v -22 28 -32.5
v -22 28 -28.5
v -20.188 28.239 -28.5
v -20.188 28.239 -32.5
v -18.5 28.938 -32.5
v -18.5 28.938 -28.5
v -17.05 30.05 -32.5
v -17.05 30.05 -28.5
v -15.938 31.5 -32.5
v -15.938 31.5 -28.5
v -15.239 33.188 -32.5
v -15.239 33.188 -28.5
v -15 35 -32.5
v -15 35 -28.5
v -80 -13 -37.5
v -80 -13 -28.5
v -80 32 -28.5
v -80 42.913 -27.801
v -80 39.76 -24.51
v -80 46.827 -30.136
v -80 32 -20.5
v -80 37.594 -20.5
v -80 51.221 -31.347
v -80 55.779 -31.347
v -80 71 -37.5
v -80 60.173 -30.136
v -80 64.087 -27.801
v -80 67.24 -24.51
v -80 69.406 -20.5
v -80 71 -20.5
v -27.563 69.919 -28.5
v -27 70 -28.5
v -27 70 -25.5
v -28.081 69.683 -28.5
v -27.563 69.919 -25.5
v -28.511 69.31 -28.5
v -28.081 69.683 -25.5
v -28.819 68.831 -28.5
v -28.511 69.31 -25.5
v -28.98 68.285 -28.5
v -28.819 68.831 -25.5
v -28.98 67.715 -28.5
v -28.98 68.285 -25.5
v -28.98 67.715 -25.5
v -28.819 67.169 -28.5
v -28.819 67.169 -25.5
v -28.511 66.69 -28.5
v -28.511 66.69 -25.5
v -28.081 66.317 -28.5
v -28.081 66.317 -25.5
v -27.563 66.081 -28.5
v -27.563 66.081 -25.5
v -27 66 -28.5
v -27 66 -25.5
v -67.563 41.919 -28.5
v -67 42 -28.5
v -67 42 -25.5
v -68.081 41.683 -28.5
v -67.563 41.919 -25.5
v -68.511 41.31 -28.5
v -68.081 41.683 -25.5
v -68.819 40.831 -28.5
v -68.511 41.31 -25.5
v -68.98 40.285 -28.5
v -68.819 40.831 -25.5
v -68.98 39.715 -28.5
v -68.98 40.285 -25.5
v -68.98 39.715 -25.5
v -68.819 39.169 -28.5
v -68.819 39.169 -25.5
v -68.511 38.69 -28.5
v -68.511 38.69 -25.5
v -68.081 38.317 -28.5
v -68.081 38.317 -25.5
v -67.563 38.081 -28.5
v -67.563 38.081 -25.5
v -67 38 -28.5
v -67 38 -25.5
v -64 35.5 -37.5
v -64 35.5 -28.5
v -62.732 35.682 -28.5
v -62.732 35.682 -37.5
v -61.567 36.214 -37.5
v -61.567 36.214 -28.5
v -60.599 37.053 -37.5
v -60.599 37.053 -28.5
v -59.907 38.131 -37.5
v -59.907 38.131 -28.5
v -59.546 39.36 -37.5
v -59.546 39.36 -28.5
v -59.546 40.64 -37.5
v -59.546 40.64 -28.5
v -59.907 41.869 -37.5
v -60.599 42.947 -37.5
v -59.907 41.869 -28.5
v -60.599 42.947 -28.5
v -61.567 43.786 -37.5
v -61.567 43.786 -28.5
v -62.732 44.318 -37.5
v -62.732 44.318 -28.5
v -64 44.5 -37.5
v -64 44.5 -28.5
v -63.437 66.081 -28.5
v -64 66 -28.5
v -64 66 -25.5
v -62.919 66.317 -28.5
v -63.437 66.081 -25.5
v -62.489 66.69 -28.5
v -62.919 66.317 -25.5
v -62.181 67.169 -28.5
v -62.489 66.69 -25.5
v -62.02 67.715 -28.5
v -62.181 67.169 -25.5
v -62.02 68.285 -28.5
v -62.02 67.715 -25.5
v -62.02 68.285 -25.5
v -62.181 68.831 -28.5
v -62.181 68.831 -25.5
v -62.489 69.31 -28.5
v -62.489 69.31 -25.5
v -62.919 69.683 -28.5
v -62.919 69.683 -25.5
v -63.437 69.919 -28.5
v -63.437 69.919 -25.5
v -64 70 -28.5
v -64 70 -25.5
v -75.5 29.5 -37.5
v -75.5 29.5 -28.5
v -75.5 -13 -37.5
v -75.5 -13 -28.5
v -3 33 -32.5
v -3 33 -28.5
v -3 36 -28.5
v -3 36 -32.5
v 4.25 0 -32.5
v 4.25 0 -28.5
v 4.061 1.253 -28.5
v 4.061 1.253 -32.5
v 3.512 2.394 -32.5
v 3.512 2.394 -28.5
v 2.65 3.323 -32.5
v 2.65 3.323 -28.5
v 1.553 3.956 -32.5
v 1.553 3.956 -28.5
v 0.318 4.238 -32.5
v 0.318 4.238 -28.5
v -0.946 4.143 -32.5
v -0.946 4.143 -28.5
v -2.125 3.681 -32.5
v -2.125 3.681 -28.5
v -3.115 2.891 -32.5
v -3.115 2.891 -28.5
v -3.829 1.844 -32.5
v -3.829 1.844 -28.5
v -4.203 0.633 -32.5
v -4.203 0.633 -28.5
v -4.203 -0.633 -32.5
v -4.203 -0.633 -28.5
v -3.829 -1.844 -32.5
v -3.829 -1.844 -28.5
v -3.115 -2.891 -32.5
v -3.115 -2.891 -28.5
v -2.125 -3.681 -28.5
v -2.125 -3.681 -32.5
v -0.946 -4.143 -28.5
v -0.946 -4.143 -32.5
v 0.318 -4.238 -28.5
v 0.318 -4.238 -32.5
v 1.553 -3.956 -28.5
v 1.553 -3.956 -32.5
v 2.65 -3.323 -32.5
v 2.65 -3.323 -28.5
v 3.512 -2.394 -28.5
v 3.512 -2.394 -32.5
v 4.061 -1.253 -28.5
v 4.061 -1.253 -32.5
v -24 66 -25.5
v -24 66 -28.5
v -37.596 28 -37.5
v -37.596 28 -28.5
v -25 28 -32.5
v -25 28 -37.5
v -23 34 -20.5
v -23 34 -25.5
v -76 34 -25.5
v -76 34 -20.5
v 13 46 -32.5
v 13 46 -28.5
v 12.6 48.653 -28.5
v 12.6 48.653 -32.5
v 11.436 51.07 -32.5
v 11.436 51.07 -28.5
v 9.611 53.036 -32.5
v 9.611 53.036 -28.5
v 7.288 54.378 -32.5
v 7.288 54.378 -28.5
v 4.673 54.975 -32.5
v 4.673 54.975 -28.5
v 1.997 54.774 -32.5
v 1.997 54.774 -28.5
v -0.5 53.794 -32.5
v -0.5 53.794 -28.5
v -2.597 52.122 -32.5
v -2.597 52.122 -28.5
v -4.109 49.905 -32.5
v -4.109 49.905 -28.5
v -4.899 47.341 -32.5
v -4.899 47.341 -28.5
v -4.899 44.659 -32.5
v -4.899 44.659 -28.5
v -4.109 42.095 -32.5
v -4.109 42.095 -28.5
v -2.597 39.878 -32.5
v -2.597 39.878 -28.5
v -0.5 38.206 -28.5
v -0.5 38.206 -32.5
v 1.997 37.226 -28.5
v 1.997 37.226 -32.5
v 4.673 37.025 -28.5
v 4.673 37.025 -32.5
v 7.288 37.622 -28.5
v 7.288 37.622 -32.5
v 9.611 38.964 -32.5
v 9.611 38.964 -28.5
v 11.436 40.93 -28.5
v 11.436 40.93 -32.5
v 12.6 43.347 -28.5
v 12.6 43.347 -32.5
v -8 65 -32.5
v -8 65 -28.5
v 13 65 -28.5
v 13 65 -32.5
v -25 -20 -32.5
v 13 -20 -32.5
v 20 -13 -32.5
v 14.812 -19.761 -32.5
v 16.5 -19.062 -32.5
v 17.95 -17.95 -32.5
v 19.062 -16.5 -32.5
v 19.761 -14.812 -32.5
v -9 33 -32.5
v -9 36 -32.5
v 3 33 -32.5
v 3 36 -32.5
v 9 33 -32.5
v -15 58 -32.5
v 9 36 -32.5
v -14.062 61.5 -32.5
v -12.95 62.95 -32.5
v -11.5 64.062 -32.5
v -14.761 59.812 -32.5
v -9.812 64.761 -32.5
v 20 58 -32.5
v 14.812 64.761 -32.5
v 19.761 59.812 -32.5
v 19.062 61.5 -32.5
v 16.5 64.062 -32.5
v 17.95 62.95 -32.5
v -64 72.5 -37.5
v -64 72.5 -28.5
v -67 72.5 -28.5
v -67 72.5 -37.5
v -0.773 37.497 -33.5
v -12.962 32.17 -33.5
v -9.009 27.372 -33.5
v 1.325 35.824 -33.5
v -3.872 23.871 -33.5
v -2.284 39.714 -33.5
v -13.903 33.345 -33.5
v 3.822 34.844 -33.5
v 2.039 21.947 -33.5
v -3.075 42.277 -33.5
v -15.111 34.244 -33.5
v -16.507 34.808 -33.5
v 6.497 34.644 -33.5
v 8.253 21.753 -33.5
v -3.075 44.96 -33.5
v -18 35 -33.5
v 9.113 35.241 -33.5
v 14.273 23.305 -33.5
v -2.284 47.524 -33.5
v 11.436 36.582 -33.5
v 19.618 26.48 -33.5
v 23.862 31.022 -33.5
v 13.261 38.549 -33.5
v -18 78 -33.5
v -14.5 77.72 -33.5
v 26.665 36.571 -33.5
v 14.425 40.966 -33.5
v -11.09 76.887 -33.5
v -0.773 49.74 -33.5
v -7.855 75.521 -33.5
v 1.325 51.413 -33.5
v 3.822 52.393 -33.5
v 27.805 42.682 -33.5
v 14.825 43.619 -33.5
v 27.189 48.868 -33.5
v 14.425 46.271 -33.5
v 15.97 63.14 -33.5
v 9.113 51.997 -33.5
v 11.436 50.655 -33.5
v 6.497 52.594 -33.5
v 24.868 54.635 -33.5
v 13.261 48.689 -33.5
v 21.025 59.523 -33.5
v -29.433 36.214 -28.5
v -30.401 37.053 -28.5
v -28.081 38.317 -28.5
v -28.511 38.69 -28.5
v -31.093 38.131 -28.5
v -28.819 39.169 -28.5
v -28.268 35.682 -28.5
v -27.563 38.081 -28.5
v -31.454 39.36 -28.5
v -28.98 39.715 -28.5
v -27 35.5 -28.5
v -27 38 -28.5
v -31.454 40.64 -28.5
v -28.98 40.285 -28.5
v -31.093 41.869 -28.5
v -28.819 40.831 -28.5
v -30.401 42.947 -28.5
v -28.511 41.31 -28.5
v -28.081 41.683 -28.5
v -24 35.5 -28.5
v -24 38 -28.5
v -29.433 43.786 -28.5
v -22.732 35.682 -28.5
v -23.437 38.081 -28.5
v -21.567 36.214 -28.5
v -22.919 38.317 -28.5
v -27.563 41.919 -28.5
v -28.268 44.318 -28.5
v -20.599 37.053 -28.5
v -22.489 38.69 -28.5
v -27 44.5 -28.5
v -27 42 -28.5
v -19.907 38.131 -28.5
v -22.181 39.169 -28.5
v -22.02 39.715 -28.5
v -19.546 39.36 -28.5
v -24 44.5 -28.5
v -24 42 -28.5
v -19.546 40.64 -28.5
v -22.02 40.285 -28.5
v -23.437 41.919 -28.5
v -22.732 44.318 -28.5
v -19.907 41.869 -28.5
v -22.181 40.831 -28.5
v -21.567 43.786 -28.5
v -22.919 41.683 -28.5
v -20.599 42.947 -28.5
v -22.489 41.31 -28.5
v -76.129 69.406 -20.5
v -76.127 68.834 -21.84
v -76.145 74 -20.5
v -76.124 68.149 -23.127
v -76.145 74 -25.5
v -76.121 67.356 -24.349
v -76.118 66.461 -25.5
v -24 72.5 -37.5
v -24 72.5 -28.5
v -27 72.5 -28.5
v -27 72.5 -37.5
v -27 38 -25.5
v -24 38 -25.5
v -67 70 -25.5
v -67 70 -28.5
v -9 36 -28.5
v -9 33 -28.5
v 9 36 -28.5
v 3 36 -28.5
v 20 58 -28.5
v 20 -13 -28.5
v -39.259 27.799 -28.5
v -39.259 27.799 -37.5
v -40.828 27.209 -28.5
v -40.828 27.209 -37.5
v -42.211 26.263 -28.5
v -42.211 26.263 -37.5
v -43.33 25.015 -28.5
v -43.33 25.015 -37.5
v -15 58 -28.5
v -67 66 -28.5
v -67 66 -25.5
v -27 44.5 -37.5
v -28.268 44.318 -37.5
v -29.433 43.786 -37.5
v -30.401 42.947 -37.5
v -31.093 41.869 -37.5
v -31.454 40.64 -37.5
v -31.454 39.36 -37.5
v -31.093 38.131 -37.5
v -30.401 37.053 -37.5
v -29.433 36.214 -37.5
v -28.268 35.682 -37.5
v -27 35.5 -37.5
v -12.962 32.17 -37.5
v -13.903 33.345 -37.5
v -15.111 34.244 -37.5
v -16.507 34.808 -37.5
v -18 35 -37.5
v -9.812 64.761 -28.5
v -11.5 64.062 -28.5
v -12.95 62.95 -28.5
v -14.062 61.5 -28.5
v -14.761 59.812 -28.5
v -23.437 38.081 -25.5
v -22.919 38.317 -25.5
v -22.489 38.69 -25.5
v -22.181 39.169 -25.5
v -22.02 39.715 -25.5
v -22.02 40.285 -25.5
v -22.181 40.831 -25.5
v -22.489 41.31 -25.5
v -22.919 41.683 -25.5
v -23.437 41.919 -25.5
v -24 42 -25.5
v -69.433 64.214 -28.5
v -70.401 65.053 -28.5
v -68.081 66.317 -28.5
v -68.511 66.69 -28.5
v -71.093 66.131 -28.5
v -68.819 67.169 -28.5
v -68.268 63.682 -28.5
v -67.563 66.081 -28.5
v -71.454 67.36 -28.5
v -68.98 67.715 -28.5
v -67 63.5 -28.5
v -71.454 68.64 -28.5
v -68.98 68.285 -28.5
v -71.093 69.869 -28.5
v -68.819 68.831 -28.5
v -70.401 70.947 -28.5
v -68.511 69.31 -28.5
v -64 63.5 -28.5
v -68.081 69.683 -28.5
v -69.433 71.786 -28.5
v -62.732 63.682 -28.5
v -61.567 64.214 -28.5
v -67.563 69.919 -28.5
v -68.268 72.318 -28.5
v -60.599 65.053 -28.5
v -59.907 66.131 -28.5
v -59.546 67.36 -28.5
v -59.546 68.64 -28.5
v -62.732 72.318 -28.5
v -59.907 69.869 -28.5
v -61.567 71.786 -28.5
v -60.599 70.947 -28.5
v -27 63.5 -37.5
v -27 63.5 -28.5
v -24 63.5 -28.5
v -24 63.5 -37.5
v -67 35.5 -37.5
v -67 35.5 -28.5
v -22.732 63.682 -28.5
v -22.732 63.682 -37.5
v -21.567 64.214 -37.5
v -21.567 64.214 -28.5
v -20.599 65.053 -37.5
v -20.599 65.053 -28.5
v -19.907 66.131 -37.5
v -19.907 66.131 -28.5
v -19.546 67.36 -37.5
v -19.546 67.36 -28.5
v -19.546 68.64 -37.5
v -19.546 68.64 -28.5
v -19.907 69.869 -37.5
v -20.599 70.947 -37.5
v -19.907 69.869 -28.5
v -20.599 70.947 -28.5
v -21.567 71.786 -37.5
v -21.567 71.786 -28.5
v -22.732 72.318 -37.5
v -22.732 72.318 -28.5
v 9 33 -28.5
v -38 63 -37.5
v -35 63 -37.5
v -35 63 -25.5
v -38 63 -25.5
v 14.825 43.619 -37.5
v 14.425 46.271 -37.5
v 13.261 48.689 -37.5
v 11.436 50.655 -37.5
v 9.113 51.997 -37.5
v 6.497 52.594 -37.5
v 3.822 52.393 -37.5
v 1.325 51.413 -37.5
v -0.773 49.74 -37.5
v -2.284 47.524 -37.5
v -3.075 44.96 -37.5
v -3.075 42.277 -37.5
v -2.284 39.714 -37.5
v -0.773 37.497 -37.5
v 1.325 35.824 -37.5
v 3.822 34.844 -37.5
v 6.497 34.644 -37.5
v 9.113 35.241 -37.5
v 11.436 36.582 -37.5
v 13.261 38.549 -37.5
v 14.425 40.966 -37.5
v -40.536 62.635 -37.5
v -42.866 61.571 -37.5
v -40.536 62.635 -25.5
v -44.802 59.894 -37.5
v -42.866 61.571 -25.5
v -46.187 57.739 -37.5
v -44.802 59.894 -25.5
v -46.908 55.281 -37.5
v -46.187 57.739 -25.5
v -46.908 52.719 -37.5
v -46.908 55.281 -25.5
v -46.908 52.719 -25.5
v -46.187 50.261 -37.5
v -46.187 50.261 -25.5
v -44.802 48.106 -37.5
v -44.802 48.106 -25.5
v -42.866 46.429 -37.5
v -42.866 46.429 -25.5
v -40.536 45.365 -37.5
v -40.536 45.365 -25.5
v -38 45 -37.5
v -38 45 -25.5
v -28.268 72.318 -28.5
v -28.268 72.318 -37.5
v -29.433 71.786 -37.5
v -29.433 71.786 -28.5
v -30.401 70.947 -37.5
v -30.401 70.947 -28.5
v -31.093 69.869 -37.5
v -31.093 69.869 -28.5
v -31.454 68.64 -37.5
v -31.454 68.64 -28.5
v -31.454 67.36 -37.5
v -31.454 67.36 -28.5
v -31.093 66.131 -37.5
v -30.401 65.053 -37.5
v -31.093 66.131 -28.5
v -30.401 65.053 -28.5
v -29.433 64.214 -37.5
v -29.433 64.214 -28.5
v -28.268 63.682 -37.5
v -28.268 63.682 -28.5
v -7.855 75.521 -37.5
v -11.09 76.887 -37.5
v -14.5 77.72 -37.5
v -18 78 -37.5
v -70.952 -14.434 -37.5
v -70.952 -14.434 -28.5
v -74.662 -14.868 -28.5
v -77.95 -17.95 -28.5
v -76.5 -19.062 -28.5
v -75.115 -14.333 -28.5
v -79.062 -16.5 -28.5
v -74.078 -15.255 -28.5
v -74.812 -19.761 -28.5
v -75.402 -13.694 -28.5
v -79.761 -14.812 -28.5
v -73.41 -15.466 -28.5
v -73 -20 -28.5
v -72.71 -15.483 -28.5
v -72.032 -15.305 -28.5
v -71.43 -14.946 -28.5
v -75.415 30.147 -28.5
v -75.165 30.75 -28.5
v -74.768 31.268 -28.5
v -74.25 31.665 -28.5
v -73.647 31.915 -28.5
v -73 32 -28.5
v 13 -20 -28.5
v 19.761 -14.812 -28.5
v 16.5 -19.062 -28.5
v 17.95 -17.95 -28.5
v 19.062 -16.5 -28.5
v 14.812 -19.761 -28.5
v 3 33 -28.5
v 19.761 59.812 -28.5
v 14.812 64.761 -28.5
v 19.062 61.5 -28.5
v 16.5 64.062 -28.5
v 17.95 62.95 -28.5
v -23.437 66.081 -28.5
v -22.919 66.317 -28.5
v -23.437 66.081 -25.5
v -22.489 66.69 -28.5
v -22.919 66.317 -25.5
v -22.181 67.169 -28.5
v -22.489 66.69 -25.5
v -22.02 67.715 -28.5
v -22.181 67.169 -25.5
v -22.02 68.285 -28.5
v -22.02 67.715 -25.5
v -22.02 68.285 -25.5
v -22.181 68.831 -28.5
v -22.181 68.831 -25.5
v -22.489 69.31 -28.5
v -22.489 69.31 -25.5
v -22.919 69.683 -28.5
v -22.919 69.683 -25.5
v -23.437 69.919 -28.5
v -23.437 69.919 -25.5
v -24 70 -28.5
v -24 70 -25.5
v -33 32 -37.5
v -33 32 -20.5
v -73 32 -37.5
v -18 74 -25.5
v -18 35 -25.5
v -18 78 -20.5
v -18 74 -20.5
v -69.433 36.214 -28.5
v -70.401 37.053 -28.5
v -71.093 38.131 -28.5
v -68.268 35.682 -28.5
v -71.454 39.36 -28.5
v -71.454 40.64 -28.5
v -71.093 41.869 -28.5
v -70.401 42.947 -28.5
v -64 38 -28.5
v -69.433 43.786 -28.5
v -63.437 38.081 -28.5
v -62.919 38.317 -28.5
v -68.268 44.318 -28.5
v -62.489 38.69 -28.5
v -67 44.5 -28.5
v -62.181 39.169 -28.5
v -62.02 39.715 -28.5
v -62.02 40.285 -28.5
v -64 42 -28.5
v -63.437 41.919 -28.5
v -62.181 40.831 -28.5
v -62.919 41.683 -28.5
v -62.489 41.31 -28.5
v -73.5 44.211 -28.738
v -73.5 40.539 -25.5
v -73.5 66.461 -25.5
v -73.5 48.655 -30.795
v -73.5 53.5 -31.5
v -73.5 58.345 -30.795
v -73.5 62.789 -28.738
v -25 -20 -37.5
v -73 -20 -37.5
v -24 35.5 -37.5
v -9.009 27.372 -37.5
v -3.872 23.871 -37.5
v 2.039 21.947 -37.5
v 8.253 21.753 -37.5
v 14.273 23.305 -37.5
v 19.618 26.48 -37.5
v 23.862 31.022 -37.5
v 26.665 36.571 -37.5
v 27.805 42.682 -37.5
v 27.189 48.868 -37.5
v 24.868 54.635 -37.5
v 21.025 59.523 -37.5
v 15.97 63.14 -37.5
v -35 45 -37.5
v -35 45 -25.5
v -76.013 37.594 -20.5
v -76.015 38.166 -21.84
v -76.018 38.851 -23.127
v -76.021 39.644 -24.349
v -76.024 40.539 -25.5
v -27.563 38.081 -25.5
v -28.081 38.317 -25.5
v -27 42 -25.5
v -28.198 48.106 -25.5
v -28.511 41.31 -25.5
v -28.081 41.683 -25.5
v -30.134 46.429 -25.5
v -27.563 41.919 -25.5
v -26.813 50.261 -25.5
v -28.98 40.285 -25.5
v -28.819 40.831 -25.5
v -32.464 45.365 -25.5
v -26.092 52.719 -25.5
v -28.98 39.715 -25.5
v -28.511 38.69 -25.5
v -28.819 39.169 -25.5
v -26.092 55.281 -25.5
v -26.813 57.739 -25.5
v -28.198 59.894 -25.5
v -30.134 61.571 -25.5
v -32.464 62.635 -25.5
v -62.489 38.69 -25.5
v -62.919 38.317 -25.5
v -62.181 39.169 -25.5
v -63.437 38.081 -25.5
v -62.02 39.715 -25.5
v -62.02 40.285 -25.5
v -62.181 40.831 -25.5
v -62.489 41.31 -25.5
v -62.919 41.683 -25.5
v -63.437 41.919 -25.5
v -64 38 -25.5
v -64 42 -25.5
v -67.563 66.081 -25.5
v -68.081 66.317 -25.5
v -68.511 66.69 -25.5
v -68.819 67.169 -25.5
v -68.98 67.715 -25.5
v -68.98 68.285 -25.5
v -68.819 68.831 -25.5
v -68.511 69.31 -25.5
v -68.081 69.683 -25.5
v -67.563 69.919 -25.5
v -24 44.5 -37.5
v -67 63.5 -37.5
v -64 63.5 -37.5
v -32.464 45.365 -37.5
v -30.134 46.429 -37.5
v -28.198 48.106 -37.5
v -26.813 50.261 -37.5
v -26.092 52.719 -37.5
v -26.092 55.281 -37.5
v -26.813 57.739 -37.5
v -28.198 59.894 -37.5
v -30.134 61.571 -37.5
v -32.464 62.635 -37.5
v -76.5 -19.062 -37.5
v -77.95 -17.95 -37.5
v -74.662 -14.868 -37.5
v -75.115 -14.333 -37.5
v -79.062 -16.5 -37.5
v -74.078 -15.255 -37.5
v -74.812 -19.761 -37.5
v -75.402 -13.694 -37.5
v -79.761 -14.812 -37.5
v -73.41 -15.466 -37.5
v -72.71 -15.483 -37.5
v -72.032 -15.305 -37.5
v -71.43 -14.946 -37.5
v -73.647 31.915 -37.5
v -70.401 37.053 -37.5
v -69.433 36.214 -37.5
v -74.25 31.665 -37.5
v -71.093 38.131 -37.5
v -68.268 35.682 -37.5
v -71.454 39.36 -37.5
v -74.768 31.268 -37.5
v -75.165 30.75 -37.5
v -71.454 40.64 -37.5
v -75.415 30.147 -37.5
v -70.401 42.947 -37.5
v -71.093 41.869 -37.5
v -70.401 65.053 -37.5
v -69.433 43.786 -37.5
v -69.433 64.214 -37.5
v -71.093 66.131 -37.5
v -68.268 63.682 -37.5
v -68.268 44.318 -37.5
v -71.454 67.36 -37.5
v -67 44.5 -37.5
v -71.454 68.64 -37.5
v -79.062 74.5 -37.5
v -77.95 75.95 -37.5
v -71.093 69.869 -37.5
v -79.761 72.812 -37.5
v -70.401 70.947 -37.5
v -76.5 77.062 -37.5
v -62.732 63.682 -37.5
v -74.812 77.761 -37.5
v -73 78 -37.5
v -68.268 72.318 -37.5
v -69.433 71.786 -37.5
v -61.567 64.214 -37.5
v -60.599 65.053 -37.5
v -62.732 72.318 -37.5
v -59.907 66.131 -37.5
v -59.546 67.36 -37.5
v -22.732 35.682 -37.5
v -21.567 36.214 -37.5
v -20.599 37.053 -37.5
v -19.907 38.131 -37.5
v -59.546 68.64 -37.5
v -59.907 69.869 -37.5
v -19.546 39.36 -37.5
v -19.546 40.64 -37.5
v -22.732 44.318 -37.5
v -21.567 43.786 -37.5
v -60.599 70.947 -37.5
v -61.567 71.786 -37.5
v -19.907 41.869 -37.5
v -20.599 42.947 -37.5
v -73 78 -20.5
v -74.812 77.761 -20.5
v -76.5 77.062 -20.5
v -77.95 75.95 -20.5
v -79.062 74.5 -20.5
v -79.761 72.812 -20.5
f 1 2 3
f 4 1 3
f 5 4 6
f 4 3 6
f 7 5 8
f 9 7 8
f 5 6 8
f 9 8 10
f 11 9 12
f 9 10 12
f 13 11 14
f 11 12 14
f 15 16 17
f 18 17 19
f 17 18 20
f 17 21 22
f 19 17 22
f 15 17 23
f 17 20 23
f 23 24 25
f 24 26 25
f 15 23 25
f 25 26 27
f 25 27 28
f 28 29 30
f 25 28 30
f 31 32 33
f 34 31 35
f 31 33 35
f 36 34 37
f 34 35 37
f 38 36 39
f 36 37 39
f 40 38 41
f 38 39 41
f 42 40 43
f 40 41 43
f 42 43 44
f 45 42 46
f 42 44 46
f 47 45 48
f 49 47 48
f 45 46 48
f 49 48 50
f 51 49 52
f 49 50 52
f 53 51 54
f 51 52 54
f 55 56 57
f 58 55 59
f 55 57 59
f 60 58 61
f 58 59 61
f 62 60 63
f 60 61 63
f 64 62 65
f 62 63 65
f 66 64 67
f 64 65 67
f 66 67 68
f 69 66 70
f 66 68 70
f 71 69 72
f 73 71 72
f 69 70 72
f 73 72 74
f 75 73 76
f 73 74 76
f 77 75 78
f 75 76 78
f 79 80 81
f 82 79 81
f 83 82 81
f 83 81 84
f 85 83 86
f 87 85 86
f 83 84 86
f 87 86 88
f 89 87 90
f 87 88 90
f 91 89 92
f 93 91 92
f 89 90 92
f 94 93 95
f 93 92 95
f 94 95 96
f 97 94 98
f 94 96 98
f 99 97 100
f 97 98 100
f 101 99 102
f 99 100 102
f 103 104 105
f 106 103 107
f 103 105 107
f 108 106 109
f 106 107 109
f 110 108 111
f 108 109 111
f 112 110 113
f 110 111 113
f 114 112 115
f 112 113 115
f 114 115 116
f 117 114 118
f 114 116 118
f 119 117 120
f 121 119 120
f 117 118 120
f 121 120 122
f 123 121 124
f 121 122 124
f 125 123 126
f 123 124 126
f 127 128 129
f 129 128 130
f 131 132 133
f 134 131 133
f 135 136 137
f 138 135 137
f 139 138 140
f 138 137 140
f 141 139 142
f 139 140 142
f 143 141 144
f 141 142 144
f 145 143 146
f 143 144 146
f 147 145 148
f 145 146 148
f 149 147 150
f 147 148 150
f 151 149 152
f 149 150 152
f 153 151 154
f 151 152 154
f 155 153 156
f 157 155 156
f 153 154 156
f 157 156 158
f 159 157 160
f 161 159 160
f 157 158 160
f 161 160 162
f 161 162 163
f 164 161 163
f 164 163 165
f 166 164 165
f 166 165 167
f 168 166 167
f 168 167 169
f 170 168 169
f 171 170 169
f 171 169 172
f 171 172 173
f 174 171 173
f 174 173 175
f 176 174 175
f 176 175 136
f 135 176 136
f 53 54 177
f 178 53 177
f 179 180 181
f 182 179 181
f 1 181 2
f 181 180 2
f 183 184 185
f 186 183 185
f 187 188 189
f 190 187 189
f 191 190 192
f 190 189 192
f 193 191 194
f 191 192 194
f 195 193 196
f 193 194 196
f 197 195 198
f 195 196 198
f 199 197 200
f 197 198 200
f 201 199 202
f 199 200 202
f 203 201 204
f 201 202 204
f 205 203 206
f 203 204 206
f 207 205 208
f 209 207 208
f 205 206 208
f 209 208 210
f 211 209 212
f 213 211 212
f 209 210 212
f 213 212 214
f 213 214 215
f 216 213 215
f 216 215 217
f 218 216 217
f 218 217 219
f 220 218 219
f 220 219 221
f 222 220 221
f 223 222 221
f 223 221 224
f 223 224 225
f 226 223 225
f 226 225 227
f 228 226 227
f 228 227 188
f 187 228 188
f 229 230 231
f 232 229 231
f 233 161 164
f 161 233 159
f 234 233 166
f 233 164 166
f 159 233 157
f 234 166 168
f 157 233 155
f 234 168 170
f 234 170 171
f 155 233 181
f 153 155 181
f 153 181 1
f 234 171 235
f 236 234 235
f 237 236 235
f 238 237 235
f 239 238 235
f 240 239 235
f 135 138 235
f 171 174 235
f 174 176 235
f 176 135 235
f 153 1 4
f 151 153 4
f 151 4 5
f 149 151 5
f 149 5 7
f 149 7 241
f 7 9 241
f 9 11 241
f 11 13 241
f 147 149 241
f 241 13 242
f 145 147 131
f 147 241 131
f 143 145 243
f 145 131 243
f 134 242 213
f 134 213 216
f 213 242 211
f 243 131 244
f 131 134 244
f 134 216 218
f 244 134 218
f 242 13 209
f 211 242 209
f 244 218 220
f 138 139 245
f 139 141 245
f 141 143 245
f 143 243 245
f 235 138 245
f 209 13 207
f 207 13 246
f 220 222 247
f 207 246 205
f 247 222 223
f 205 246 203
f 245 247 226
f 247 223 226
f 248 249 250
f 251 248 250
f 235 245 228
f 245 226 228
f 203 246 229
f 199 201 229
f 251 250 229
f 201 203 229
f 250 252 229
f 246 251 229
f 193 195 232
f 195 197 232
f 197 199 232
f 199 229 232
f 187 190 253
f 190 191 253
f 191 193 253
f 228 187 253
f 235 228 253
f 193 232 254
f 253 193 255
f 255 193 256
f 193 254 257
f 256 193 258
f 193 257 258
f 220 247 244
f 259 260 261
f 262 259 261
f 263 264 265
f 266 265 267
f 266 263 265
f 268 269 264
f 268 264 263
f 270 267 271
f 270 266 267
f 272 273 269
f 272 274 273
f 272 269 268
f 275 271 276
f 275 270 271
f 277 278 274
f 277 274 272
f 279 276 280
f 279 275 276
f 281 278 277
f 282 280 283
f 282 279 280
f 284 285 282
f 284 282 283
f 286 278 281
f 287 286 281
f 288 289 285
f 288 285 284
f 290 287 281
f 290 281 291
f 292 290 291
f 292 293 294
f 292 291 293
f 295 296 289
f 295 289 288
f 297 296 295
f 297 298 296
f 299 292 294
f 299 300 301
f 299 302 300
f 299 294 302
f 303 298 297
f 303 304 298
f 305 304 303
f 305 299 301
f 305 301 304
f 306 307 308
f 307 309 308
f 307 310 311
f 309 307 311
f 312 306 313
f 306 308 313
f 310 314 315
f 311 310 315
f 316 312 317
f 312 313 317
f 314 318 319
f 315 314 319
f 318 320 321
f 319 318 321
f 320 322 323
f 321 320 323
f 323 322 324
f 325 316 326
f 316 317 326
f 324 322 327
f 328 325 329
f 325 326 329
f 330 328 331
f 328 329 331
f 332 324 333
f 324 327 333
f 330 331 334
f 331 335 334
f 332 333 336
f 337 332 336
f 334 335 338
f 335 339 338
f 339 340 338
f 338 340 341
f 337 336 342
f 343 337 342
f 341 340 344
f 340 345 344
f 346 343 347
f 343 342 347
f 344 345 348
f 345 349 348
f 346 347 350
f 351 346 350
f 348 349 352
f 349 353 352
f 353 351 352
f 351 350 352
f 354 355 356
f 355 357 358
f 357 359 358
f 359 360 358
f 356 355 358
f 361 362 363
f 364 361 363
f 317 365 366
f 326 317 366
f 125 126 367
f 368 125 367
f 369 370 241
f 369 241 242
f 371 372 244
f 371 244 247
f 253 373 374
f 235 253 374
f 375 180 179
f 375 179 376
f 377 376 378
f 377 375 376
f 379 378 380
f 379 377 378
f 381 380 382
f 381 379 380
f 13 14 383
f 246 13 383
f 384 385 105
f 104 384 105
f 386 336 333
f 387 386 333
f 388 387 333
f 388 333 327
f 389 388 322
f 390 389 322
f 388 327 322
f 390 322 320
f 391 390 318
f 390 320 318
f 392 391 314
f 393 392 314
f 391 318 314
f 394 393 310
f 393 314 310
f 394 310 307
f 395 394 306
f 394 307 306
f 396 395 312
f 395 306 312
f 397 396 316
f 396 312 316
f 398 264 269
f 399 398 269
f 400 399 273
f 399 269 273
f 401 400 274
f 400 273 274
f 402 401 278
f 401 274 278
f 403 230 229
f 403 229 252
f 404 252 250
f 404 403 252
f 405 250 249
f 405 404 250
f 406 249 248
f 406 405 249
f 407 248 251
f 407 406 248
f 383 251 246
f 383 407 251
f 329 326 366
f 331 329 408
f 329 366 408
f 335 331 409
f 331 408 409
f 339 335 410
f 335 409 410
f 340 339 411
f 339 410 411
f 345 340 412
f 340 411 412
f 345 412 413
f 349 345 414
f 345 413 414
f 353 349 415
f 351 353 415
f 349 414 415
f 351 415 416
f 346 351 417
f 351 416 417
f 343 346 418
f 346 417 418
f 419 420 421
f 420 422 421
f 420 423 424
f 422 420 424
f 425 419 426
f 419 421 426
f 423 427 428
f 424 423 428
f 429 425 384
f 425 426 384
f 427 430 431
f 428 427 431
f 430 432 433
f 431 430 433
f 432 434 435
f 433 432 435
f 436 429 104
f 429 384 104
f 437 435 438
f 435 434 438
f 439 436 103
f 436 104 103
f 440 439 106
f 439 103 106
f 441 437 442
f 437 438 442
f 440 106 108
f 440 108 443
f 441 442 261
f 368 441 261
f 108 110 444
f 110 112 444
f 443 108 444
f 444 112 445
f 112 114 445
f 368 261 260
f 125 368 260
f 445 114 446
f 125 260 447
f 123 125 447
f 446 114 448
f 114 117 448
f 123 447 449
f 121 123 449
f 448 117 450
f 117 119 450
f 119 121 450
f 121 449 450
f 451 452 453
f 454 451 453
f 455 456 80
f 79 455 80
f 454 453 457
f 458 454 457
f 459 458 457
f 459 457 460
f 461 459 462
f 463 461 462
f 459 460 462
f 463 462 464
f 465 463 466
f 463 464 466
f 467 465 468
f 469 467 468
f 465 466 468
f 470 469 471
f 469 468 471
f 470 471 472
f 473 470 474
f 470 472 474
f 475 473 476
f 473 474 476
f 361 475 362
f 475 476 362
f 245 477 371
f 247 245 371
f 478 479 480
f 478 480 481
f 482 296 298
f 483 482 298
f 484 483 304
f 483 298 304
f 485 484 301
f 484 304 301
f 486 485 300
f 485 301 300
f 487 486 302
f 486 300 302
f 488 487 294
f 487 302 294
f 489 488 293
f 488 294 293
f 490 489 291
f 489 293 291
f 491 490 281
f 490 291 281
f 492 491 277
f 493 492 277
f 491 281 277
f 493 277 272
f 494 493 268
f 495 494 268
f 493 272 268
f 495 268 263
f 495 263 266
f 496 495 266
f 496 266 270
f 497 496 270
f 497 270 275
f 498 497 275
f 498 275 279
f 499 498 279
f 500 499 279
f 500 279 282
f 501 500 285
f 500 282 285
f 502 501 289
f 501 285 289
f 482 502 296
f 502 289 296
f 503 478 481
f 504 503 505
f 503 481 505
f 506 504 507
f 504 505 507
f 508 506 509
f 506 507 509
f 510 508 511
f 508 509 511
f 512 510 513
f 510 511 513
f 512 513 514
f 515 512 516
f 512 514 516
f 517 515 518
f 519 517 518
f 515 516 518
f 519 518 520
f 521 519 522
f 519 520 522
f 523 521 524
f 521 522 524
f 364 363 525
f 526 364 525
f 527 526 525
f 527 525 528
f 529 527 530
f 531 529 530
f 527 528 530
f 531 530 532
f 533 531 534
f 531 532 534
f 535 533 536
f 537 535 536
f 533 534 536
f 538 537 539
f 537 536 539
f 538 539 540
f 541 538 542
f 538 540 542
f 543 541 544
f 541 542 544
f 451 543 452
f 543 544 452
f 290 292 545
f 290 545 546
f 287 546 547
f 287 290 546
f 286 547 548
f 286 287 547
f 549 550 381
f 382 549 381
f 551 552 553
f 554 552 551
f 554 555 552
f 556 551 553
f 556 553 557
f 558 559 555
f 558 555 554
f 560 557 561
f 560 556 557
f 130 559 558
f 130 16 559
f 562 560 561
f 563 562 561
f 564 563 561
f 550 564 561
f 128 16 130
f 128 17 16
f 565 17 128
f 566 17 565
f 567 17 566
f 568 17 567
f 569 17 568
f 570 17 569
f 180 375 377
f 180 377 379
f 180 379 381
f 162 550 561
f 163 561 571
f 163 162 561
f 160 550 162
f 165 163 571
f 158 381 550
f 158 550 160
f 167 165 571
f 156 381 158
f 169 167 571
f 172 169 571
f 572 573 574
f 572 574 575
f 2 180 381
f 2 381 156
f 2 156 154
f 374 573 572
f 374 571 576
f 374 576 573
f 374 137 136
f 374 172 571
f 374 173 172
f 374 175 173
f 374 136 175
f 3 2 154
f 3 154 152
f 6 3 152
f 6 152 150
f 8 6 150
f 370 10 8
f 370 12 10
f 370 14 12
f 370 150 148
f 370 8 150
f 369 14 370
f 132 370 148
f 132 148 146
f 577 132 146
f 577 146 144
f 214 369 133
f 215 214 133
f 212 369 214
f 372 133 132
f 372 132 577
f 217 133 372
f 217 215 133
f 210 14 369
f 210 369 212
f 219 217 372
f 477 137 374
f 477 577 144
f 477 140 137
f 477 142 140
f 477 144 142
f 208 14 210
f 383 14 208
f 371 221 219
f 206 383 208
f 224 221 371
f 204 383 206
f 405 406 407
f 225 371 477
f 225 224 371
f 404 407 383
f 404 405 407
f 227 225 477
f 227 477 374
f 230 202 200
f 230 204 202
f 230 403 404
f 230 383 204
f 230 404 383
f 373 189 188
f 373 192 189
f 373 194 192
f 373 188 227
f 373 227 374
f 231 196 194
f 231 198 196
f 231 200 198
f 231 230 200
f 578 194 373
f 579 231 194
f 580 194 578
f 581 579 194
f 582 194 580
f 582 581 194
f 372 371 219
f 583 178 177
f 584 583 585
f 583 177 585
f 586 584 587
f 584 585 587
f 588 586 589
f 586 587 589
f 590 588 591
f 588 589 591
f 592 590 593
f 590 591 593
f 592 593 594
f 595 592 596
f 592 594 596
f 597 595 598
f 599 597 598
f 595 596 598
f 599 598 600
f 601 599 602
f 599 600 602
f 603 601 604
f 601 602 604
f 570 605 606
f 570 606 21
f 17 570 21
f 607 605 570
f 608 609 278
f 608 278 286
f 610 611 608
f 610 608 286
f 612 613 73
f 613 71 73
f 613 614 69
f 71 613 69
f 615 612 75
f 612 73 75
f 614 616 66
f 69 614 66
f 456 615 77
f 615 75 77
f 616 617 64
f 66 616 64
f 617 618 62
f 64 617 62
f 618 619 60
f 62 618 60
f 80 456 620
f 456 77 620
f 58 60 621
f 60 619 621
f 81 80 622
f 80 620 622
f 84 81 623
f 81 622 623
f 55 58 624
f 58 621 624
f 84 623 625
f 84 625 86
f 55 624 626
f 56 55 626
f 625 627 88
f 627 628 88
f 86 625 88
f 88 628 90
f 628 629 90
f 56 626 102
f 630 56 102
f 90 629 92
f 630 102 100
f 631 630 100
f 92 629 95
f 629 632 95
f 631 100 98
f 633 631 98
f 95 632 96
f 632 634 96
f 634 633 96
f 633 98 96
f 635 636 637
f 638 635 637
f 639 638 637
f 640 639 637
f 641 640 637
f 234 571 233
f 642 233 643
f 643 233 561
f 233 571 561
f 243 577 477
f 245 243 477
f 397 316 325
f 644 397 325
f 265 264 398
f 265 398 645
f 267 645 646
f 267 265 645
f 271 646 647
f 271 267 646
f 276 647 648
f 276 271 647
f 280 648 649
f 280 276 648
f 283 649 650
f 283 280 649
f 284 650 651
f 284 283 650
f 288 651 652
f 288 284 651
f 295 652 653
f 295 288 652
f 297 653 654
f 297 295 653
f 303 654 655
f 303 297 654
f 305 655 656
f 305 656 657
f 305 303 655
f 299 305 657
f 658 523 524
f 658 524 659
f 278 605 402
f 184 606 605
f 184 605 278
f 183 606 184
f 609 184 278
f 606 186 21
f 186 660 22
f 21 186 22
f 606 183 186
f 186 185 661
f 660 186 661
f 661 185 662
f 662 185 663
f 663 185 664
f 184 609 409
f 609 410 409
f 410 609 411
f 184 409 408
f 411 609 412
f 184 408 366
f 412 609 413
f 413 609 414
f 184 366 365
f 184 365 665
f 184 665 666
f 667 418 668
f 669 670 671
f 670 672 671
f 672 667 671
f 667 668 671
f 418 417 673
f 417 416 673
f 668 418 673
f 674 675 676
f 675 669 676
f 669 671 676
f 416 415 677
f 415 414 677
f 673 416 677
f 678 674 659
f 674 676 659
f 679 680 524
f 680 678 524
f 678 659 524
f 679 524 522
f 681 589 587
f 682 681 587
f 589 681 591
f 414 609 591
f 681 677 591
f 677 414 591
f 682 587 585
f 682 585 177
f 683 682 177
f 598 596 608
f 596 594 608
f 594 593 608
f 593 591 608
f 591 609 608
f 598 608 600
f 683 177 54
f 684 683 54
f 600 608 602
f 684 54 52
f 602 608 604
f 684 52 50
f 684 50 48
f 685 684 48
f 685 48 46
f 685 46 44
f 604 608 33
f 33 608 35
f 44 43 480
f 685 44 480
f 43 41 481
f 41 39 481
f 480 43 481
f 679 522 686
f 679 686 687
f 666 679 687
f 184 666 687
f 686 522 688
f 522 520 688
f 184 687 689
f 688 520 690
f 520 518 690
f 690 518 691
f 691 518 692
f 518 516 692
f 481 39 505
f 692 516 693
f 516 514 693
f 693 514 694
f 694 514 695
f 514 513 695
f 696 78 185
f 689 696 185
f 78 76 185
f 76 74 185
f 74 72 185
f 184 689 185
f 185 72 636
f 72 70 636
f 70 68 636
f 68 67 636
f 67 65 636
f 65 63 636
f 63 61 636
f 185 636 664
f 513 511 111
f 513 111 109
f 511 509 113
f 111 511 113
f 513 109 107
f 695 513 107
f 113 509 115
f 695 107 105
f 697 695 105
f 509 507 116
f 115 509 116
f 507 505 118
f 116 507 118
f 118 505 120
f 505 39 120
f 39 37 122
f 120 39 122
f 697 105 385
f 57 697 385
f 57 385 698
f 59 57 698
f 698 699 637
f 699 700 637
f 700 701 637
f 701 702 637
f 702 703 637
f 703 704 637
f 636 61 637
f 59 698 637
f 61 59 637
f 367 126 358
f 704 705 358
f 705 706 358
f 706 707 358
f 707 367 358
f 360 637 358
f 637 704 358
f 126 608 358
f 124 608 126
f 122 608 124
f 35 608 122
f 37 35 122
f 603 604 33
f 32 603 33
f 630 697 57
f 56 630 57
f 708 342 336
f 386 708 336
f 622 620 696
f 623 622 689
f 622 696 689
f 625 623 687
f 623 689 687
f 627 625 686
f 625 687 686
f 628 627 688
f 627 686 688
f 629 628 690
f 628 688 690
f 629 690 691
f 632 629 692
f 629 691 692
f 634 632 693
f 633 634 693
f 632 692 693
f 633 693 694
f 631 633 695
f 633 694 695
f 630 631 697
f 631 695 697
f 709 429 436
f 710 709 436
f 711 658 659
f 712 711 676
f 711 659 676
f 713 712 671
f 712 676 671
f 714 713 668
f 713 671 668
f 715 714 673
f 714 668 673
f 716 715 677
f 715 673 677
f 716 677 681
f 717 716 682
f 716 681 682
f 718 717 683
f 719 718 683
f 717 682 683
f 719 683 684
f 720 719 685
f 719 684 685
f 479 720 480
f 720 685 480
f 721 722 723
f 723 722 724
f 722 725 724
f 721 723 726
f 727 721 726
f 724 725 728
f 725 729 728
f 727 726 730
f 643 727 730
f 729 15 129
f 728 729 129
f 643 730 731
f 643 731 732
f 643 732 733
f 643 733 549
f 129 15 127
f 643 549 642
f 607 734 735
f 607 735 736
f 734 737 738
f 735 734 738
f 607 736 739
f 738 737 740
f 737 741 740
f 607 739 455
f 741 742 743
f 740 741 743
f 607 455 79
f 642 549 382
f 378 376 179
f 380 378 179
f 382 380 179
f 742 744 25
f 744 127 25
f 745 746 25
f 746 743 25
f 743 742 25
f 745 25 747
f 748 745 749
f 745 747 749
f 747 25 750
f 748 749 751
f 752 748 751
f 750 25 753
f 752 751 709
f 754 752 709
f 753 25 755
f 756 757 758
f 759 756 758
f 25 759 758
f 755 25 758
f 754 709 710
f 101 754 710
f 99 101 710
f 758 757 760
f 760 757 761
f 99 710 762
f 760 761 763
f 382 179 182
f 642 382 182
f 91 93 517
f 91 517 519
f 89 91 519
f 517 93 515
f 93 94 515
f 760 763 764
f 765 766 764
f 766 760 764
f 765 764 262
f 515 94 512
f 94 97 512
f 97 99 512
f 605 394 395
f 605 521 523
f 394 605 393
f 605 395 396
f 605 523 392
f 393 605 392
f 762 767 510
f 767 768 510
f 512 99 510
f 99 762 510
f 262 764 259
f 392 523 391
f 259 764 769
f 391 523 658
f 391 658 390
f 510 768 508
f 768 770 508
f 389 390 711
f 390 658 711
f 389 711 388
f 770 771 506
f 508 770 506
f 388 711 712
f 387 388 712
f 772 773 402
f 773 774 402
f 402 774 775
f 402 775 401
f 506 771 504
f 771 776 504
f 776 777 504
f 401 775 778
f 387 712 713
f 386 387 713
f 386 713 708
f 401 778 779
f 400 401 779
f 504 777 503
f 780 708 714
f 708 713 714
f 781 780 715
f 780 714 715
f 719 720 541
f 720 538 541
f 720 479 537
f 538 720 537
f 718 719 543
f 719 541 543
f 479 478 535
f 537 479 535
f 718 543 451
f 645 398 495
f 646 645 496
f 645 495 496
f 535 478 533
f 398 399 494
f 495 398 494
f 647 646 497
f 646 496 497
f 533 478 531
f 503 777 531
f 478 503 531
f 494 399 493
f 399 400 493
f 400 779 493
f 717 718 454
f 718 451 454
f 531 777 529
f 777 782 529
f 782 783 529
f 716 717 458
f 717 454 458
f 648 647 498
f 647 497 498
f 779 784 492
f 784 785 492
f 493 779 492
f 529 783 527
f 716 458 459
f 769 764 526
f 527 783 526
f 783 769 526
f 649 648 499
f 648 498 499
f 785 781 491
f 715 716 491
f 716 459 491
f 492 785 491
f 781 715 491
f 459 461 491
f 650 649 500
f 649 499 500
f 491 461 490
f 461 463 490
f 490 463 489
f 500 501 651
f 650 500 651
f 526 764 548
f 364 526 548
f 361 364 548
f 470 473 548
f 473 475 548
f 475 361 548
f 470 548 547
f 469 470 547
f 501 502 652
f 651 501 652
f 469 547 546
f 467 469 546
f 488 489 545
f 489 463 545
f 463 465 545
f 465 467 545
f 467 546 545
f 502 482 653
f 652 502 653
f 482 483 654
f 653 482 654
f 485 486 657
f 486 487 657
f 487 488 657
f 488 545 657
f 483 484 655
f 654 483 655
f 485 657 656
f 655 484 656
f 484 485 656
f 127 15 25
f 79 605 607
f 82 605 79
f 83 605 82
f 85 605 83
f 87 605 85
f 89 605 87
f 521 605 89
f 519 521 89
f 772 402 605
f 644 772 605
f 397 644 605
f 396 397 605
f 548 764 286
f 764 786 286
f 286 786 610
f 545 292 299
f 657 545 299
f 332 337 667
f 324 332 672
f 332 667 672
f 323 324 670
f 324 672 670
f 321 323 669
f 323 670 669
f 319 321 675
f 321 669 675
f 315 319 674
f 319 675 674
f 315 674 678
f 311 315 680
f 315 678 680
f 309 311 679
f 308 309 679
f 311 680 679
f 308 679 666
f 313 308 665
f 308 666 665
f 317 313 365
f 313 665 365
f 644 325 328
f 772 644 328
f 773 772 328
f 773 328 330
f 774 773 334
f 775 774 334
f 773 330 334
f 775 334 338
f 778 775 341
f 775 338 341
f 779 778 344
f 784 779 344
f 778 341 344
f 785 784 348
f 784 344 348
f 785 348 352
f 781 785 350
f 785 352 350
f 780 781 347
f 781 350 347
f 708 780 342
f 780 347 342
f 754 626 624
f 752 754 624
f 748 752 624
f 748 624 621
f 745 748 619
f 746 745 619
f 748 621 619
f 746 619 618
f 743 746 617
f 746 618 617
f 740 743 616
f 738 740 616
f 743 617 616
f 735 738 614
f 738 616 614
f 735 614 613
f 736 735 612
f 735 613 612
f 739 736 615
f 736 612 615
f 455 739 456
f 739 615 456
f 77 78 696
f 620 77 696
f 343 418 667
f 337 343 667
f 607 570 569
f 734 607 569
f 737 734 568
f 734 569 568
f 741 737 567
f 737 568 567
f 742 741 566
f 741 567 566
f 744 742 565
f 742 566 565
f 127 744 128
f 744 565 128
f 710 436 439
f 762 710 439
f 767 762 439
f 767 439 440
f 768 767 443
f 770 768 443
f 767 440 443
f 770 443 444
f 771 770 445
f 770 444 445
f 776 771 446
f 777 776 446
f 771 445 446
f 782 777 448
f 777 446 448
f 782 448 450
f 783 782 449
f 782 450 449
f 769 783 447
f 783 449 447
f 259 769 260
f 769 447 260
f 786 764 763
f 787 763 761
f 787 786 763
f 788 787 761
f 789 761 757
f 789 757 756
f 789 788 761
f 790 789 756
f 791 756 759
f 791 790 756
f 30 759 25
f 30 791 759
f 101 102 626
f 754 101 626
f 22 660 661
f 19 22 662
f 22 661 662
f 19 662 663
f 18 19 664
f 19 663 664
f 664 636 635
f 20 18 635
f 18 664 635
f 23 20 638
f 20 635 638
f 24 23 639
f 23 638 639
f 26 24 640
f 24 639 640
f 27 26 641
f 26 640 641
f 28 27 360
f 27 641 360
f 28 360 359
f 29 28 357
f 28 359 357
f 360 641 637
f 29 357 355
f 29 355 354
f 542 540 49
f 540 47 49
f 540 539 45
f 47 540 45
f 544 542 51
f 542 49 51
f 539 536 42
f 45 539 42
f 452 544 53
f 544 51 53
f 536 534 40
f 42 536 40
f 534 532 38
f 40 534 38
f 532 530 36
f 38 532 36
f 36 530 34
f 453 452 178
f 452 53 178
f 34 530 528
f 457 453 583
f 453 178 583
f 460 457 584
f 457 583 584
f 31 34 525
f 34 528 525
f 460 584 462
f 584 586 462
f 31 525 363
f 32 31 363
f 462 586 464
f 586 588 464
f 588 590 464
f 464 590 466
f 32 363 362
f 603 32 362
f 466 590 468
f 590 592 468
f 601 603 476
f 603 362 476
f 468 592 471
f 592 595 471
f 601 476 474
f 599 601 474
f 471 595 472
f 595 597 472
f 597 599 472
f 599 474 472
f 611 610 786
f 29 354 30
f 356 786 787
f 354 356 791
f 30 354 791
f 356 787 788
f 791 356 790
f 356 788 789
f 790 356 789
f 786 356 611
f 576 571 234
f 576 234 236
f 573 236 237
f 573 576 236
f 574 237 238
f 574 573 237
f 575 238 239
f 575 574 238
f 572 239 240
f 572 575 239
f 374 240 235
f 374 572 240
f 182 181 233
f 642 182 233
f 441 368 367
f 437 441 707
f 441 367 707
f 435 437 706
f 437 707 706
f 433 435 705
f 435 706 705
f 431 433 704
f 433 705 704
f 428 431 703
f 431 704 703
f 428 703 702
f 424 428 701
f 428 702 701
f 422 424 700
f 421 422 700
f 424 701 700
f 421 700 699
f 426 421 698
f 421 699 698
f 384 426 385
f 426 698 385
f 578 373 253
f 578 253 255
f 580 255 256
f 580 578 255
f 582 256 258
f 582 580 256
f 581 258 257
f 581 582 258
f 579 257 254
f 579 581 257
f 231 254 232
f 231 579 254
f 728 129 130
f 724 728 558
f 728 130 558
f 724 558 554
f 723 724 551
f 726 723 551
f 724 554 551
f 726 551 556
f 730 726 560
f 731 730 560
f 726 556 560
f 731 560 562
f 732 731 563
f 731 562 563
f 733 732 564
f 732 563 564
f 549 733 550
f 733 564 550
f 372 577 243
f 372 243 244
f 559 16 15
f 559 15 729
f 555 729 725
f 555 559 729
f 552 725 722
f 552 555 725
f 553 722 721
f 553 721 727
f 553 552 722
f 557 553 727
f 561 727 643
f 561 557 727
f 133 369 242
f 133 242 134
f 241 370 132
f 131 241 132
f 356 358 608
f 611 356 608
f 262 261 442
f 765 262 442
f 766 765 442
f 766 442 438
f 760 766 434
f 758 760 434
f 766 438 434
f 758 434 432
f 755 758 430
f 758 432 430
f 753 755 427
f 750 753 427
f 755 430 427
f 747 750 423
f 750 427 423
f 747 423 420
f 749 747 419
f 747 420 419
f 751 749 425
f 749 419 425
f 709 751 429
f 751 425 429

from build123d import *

# Parameters (mm, degrees)
SKETCH023_R       = 4.25
SKETCH023_R_2     = 9
SKETCH023_W       = 6
SKETCH023_H       = 3
PAD013_DEPTH      = 8
PAD013_DEPTH_BACK = 9
POCKET010_DEPTH   = 5.001
SKETCH028_R       = 17
POCKET011_DEPTH   = 6.501
POCKET012_DEPTH   = 8.001
POCKET013_DEPTH   = 5.001
SKETCH031_R       = 9
PAD014_DEPTH      = 4
POCKET014_DEPTH   = 9.001


with BuildPart() as part:
    # Sketch023 → Pad013 (new body, two sides)
    with BuildSketch(Plane.XY) as pad013_sk:
        with BuildLine():
            Line((20, 58), (20, -13))
            ThreePointArc((13, -20), (17.949747, -17.949747), (20, -13))
            Line((13, -20), (-73, -20))
            ThreePointArc((-80, -13), (-77.949747, -17.949747), (-73, -20))
            Line((-80, -13), (-80, 71))
            ThreePointArc((-73, 78), (-77.949747, 75.949747), (-80, 71))
            Line((-73, 78), (-18, 78))
            Line((-18, 35), (-18, 78))
            Line((-33, 32), (-18, 35))
            Line((-73, 32), (-33, 32))
            ThreePointArc((-73, 32), (-74.767767, 31.267767), (-75.5, 29.5))
            Line((-75.5, 29.5), (-75.5, -13))
            ThreePointArc((-75.5, -13), (-73.751764, -15.384292), (-70.95212, -14.433941))
            Line((-70.95212, -14.433941), (-43.329649, 25.015035))
            ThreePointArc((-37.595585, 28), (-40.827825, 27.209076), (-43.329649, 25.015035))
            Line((-37.595585, 28), (-22, 28))
            ThreePointArc((-22, 28), (-17.050253, 30.050253), (-15, 35))
            Line((-15, 35), (-15, 58))
            ThreePointArc((-8, 65), (-12.949747, 62.949747), (-15, 58))
            Line((-8, 65), (13, 65))
            ThreePointArc((20, 58), (17.949747, 62.949747), (13, 65))
        make_face()
        Circle(SKETCH023_R, mode=Mode.SUBTRACT)
        with Locations((4, 46)):
            Circle(SKETCH023_R_2, mode=Mode.SUBTRACT)
        with BuildLine():
            ThreePointArc((-38, 63), (-47, 54), (-38, 45))
            Line((-38, 45), (-35, 45))
            ThreePointArc((-35, 45), (-26, 54), (-35, 63))
            Line((-35, 63), (-38, 63))
        make_face(mode=Mode.SUBTRACT)
        with BuildLine():
            ThreePointArc((-67, 70), (-69, 68), (-67, 66))
            Line((-67, 66), (-64, 66))
            ThreePointArc((-64, 66), (-62, 68), (-64, 70))
            Line((-64, 70), (-67, 70))
        make_face(mode=Mode.SUBTRACT)
        with BuildLine():
            ThreePointArc((-67, 42), (-69, 40), (-67, 38))
            Line((-67, 38), (-64, 38))
            ThreePointArc((-64, 38), (-62, 40), (-64, 42))
            Line((-64, 42), (-67, 42))
        make_face(mode=Mode.SUBTRACT)
        with Locations((6, 34.5)):
            Rectangle(SKETCH023_W, SKETCH023_H, mode=Mode.SUBTRACT)
        with Locations((-6, 34.5)):
            Rectangle(SKETCH023_W, SKETCH023_H, mode=Mode.SUBTRACT)
        with BuildLine():
            ThreePointArc((-27, 70), (-29, 68), (-27, 66))
            Line((-27, 66), (-24, 66))
            ThreePointArc((-24, 66), (-22, 68), (-24, 70))
            Line((-24, 70), (-27, 70))
        make_face(mode=Mode.SUBTRACT)
        with BuildLine():
            ThreePointArc((-27, 42), (-29, 40), (-27, 38))
            Line((-27, 38), (-24, 38))
            ThreePointArc((-24, 38), (-22, 40), (-24, 42))
            Line((-24, 42), (-27, 42))
        make_face(mode=Mode.SUBTRACT)
    extrude(amount=PAD013_DEPTH)
    extrude(pad013_sk.sketch, amount=-PAD013_DEPTH_BACK)

    # Sketch025 → Pocket010 (cut, through all)
    with BuildSketch(Plane.XY.offset(3)):
        Polygon((-76.145312, 74), (-16.940075, 74), (-16.940075, 34), (-76, 34), align=None)
    extrude(amount=POCKET010_DEPTH, mode=Mode.SUBTRACT)

    # Sketch028 → Pocket011 (cut, through all)
    with BuildSketch(Plane.YZ.offset(-73.5)):
        with Locations((53.5, 14)):
            Circle(SKETCH028_R)
    extrude(amount=-POCKET011_DEPTH, mode=Mode.SUBTRACT)

    # Sketch029 → Pocket012 (cut, through all)
    with BuildSketch(Plane.XY):
        Polygon((-85.091896, 32), (-85.091896, -28.781052), (33.933025, -28.781052), (33.933025, 68.141579), (-16, 68.141579), (-16, 32), align=None)
    extrude(amount=POCKET012_DEPTH, mode=Mode.SUBTRACT)

    # Sketch030 → Pocket013 (cut, through all)
    with BuildSketch(Plane.XY.offset(-4)):
        Polygon((30.837446, 73.192078), (-15.70892, 73.192078), (-15.70892, 34.728077), (-25, 32), (-25, -27.823572), (30.837446, -27.823572), align=None)
    extrude(amount=-POCKET013_DEPTH, mode=Mode.SUBTRACT)

    # Sketch031 → Pad014 (join)
    with BuildSketch(Plane.XY.offset(-5)):
        with BuildLine():
            ThreePointArc((-12.961917, 32.170317), (21.901003, 28.600337), (15.969569, 63.139967))
            Line((-7.855077, 75.521284), (15.969569, 63.139967))
            ThreePointArc((-7.855077, 75.521284), (-12.778326, 77.371339), (-18, 78))
            Line((-18, 78), (-18, 35))
            ThreePointArc((-12.961917, 32.170317), (-15.110823, 34.244164), (-18, 35))
        make_face()
        with Locations((5.824645, 43.618683)):
            Circle(SKETCH031_R, mode=Mode.SUBTRACT)
    extrude(amount=-PAD014_DEPTH)

    # Sketch032 → Pocket014 (cut, through all)
    with BuildSketch(Plane.XY):
        with BuildLine():
            ThreePointArc((-67, 44.5), (-71.5, 40), (-67, 35.5))
            Line((-67, 35.5), (-64, 35.5))
            ThreePointArc((-64, 35.5), (-59.5, 40), (-64, 44.5))
            Line((-64, 44.5), (-67, 44.5))
        make_face()
        with BuildLine():
            ThreePointArc((-67, 72.5), (-71.5, 68), (-67, 63.5))
            Line((-67, 63.5), (-64, 63.5))
            ThreePointArc((-64, 63.5), (-59.5, 68), (-64, 72.5))
            Line((-64, 72.5), (-67, 72.5))
        make_face()
        with BuildLine():
            ThreePointArc((-27, 72.5), (-31.5, 68), (-27, 63.5))
            Line((-27, 63.5), (-24, 63.5))
            ThreePointArc((-24, 63.5), (-19.5, 68), (-24, 72.5))
            Line((-24, 72.5), (-27, 72.5))
        make_face()
        with BuildLine():
            ThreePointArc((-27, 44.5), (-31.5, 40), (-27, 35.5))
            Line((-27, 35.5), (-24, 35.5))
            ThreePointArc((-24, 35.5), (-19.5, 40), (-24, 44.5))
            Line((-24, 44.5), (-27, 44.5))
        make_face()
    extrude(amount=-POCKET014_DEPTH, mode=Mode.SUBTRACT)


with BuildPart() as part_1:
    # Body009 placement: moved
    add(part.part.moved(Location((0, 0, -28.5))))


solid = part_1.part
